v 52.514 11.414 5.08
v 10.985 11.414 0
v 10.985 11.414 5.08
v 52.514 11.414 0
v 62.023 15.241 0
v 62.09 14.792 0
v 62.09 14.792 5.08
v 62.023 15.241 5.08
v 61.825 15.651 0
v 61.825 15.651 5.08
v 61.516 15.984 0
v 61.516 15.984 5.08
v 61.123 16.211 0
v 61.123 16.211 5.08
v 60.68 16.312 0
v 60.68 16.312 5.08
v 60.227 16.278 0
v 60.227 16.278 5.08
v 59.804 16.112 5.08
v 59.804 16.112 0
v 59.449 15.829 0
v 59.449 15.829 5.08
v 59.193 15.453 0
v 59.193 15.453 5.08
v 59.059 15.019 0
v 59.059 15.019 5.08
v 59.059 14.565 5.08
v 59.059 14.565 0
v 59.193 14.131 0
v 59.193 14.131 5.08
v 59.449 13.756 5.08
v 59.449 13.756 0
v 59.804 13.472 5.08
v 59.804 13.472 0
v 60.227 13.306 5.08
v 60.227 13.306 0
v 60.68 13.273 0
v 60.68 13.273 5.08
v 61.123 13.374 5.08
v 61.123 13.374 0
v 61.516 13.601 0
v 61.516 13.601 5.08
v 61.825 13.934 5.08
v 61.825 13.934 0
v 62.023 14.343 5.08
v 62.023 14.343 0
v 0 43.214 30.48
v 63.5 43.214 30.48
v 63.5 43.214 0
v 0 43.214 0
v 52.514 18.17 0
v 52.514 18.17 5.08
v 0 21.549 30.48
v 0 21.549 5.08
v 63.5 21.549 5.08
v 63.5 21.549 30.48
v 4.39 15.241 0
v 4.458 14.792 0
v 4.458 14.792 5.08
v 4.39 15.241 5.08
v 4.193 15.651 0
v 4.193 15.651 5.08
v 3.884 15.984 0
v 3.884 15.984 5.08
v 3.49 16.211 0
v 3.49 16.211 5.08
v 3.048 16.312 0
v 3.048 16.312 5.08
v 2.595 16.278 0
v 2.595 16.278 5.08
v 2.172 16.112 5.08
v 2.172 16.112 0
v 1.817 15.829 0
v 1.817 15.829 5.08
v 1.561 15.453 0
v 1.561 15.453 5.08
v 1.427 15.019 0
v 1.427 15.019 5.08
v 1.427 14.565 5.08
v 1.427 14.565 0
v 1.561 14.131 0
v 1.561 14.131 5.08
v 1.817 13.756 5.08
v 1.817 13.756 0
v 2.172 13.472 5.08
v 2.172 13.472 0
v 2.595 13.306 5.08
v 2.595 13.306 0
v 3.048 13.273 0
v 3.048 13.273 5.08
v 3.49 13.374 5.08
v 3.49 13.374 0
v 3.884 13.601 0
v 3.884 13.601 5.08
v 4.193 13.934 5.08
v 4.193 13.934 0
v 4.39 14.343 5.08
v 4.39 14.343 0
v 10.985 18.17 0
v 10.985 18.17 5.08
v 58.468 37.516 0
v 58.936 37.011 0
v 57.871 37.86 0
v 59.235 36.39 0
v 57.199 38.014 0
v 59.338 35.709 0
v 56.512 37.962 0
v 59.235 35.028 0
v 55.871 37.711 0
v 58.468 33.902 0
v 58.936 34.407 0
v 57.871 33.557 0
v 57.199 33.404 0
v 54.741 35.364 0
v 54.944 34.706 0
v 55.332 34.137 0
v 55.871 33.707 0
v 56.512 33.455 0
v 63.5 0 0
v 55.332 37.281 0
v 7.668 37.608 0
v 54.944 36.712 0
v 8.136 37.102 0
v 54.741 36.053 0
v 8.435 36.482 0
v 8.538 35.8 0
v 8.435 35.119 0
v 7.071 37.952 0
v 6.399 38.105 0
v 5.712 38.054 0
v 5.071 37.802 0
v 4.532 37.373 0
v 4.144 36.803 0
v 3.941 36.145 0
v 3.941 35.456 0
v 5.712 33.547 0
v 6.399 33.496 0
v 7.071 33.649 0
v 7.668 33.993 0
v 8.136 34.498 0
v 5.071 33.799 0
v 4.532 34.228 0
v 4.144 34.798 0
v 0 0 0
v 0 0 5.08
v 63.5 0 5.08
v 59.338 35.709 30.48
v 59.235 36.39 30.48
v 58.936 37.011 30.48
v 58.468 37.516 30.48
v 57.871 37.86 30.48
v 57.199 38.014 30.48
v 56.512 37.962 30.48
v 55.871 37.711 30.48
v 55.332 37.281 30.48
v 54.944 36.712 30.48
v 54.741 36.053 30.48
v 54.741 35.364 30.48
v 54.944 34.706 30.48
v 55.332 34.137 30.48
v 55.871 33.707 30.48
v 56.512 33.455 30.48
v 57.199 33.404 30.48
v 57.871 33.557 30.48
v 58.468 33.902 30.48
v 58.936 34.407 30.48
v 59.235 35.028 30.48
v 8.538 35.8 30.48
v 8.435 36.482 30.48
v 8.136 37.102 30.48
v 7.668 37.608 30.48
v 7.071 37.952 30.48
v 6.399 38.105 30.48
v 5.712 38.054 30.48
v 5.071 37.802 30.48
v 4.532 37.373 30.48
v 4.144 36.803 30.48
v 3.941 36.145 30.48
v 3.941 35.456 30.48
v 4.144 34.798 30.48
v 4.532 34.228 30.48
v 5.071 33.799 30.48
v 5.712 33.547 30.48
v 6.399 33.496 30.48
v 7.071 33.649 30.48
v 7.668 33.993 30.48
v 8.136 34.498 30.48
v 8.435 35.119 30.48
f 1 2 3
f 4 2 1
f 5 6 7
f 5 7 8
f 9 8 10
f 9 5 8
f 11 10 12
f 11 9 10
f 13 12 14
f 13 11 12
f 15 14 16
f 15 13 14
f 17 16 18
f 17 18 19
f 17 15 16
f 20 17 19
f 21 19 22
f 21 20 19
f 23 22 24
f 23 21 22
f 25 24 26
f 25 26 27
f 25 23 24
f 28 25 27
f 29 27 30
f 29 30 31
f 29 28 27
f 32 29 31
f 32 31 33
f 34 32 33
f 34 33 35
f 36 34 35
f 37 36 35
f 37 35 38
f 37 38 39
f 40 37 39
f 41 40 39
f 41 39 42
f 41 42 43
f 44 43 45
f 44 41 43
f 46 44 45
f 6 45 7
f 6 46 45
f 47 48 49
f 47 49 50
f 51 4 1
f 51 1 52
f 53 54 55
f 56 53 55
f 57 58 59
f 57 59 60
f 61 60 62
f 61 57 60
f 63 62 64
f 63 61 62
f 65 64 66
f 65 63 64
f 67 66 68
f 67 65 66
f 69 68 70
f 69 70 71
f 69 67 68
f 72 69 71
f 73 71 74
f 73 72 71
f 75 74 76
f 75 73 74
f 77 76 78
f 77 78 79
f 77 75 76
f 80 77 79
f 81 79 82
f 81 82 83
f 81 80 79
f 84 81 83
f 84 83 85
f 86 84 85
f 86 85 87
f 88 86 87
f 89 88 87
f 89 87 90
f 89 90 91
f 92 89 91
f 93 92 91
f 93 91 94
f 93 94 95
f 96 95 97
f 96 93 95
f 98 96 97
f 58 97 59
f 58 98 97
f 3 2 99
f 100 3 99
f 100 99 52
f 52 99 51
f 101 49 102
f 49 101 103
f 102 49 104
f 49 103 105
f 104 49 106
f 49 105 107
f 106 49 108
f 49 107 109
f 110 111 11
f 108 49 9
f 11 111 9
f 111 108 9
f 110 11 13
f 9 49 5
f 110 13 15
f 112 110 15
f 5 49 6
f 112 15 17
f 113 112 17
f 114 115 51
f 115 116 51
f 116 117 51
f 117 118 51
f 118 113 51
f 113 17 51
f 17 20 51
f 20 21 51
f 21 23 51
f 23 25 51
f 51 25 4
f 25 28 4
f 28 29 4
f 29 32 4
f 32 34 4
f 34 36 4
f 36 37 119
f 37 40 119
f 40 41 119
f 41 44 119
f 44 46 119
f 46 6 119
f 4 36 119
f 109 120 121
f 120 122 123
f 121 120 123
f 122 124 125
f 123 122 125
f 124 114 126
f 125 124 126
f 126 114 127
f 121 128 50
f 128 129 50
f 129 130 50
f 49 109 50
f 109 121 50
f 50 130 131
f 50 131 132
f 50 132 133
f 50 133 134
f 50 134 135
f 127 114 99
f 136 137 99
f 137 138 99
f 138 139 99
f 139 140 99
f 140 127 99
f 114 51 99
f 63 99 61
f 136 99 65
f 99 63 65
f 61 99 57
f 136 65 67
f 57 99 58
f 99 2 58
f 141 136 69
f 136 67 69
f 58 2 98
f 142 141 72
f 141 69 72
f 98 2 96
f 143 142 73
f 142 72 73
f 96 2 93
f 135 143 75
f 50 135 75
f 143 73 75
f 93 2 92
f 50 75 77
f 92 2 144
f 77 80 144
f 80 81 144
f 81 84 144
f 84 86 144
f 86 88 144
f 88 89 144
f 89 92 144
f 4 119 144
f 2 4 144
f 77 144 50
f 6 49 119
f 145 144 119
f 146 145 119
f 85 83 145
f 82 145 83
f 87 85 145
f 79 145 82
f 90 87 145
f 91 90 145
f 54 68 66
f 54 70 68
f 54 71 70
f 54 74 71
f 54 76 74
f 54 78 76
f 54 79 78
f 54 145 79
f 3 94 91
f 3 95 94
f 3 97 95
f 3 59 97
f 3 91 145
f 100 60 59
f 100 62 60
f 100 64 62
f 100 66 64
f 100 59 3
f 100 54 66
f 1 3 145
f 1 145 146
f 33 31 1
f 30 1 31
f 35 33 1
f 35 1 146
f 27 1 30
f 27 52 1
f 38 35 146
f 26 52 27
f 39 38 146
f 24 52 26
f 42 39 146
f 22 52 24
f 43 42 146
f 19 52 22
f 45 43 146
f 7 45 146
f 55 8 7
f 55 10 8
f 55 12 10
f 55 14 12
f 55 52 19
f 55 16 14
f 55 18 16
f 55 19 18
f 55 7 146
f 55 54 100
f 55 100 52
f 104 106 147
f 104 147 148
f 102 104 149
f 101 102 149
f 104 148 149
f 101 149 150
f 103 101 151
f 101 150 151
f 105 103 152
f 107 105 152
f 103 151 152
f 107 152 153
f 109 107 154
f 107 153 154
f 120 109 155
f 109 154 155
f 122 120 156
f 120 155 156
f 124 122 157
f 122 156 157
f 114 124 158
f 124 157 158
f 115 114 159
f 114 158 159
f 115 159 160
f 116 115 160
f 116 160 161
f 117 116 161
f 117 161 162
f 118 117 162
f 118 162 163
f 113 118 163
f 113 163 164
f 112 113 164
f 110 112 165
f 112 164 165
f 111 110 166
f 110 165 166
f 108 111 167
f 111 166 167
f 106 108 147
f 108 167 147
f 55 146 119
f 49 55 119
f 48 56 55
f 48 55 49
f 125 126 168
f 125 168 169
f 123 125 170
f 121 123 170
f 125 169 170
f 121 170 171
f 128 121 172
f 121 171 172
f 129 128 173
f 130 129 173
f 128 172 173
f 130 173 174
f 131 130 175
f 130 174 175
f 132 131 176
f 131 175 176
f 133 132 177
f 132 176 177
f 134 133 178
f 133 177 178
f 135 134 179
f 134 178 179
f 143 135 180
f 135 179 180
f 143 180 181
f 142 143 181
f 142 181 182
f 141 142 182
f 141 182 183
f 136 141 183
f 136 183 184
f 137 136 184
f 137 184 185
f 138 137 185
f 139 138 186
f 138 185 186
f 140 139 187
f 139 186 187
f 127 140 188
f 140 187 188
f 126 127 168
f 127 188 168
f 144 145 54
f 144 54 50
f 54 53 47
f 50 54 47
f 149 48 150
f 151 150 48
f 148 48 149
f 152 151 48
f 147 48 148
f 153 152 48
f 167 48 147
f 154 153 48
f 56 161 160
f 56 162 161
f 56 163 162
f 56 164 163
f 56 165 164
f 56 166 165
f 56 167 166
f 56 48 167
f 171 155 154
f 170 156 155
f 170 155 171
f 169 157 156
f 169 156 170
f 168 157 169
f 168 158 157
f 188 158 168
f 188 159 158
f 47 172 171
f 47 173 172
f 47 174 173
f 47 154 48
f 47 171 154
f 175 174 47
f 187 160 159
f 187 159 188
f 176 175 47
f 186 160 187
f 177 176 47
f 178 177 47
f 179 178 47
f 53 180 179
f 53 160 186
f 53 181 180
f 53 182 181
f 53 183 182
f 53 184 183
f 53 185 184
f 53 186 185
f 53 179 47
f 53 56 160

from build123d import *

# Parameters (mm, degrees)
F0_W     = 63.5
F0_H     = 30.5136416812
F0_R     = 1.524
F0_W_2   = 41.529
F0_H_2   = 6.7564
F1_DEPTH = 5.08
F2_W     = 63.5
F2_H     = 8.9645285864
F3_DEPTH = 25.4
F4_W     = 63.5
F4_H     = 8.5140008438
F5_DEPTH = 12.7
F6_R     = 2.3114
F7_DEPTH = 25.4
F8_DEPTH = 21.9659991562


with BuildPart() as f1:
    # F0 (on Top) → F1 (new body)
    with BuildSketch(Plane.XY):
        with Locations((31.75, 15.2568208406)):
            Rectangle(F0_W, F0_H)
        with Locations((2.9337, 14.7922589307)):
            Circle(F0_R, mode=Mode.SUBTRACT)
        with Locations((31.75, 14.7922589307)):
            Rectangle(F0_W_2, F0_H_2, mode=Mode.SUBTRACT)
        with Locations((60.5663, 14.7922589307)):
            Circle(F0_R, mode=Mode.SUBTRACT)
    extrude(amount=F1_DEPTH)

    # F2 (on face) → F3 (join)
    with BuildSketch(Plane.XY.offset(5.08)):
        with Locations((31.75, 26.031377388)):
            Rectangle(F2_W, F2_H)
    extrude(amount=F3_DEPTH)

    # F4 (on face) → F5 (join)
    with BuildSketch(Plane(origin=(0, 30.5136416812, 0), x_dir=(-1, 0, 0), z_dir=(0, 1, 0))):
        with Locations((-31.75, 26.2229995781)):
            Rectangle(F4_W, F4_H)
    extrude(amount=F5_DEPTH)

    # F6 (on face) → F7 (cut)
    with BuildSketch(Plane.XY.offset(30.48)):
        with Locations((57.0266509049, 35.708874464)):
            Circle(F6_R)
        with Locations((6.2266509049, 35.8004383743)):
            Circle(F6_R)
    extrude(amount=-F7_DEPTH, mode=Mode.SUBTRACT)

    # F8 (add, through all): a face of the model
    f8_faces = [f1.faces().sort_by_distance(p)[0] for p in [
        (31.7553573875, 36.9118079348, 21.9659991562),
    ]]
    extrude(f8_faces, amount=F8_DEPTH)


solid = f1.part
